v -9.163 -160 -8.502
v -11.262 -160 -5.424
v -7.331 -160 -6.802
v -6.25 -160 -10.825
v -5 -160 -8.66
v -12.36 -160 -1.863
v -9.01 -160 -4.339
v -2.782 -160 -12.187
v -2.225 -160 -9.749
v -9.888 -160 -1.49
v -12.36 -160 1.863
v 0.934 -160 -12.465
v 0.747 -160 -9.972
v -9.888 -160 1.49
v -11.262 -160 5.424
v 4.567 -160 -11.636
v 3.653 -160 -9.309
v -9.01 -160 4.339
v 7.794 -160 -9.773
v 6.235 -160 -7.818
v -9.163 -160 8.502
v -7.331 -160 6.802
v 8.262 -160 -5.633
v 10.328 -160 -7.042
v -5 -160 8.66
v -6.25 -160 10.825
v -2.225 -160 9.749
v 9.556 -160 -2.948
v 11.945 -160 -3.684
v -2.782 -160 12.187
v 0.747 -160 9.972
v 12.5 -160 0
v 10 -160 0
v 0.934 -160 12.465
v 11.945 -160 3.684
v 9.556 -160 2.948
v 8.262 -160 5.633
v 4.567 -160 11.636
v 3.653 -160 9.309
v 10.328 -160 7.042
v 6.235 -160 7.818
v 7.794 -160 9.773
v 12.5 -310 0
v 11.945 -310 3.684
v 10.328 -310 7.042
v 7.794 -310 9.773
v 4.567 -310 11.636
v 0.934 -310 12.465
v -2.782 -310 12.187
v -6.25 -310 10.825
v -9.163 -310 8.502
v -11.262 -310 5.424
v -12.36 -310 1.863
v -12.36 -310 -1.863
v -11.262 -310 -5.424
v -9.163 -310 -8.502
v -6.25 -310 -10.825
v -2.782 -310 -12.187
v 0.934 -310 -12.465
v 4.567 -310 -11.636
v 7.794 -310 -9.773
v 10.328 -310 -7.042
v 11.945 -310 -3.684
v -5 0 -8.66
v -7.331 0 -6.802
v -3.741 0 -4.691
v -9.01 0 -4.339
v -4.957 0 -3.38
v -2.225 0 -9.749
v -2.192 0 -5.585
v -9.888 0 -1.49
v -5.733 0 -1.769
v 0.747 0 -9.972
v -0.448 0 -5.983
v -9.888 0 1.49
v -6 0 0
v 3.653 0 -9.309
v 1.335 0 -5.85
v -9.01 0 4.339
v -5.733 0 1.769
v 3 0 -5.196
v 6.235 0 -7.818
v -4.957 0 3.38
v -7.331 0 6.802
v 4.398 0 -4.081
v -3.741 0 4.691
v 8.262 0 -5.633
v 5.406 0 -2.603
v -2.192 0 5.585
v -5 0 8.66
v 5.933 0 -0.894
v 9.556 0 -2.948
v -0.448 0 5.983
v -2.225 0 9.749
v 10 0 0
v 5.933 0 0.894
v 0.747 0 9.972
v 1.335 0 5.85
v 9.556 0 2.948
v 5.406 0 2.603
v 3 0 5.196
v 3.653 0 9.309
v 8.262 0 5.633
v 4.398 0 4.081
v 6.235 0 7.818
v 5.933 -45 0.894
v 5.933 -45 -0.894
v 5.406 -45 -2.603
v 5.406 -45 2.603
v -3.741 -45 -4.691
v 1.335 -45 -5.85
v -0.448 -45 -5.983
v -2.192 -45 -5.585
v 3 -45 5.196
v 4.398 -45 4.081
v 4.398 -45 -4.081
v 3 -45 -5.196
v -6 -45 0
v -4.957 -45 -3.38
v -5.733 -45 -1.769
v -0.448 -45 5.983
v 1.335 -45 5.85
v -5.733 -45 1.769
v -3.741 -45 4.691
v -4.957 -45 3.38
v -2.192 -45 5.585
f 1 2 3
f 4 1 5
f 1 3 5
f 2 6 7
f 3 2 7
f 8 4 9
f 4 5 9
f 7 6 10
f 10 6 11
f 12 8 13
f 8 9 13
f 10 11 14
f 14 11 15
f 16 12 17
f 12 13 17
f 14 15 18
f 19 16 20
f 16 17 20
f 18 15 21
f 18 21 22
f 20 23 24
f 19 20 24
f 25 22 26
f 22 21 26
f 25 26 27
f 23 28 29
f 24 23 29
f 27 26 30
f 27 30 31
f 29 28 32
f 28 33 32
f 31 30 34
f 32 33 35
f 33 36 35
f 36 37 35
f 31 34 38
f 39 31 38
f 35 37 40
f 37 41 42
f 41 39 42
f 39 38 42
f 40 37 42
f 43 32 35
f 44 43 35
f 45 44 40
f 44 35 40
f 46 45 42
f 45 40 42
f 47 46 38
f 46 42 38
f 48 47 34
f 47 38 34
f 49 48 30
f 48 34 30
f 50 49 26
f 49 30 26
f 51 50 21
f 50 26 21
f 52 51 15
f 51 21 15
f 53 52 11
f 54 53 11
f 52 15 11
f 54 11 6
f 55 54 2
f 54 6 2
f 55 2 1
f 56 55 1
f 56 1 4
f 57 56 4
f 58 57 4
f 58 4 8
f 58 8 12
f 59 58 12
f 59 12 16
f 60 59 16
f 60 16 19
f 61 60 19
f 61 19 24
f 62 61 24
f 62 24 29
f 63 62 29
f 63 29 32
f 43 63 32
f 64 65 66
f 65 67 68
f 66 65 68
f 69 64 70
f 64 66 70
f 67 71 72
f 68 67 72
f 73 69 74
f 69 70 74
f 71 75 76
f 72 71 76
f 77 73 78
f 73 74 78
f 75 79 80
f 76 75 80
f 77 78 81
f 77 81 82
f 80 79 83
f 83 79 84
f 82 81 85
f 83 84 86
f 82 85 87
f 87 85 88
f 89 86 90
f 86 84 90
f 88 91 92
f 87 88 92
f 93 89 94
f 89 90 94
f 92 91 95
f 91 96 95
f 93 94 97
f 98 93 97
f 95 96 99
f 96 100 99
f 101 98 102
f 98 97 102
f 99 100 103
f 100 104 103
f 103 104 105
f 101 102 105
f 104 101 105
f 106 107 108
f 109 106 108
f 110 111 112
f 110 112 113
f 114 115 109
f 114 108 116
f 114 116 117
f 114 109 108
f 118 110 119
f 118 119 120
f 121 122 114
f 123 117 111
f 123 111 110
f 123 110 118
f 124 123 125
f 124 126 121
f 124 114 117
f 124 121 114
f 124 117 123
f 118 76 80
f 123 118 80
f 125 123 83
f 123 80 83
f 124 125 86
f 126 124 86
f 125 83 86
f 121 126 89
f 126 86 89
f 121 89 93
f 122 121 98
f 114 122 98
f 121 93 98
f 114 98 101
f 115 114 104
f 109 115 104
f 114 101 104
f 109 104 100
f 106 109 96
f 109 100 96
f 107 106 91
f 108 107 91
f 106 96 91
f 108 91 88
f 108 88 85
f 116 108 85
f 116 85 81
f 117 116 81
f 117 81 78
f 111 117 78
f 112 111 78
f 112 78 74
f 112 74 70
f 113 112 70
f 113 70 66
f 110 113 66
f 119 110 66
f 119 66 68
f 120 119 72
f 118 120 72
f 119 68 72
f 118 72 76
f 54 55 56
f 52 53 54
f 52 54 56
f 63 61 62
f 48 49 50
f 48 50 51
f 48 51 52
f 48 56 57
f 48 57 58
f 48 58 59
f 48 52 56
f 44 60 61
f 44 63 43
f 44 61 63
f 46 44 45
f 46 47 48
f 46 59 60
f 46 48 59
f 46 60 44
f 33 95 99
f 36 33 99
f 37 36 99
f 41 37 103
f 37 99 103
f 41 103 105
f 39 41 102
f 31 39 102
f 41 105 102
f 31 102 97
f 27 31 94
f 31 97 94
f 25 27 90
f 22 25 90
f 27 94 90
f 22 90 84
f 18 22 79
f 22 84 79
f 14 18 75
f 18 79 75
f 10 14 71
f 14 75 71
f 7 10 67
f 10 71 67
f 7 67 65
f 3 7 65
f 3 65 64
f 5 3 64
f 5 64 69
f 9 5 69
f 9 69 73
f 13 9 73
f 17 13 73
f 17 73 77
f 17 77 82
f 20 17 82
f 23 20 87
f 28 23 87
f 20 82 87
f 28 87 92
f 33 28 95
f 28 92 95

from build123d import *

# Parameters (mm, degrees)
F0_R     = 12.5
F1_DEPTH = 310
F2_R     = 6
F3_DEPTH = 45
F4_SIZE  = 1
F5_R     = 20.961122
F5_R_2   = 10
F6_DEPTH = 160


with BuildPart() as f1:
    # F0 (on Front) → F1 (new body)
    with BuildSketch(Plane.XZ):
        Circle(F0_R)
    extrude(amount=F1_DEPTH)

    # F2 (on face) → F3 (cut)
    with BuildSketch(Plane(origin=(0, 0, 0), x_dir=(-1, 0, 0), z_dir=(0, 1, 0))):
        Circle(F2_R)
    extrude(amount=-F3_DEPTH, mode=Mode.SUBTRACT)

    # F4
    f4_edges = [f1.edges().sort_by_distance(p)[0] for p in [
        (-12.5, 0, 0),
    ]]
    chamfer(f4_edges, length=F4_SIZE)

    # F5 (on Front) → F6 (cut)
    with BuildSketch(Plane.XZ):
        Circle(F5_R)
        Circle(F5_R_2, mode=Mode.SUBTRACT)
    extrude(amount=F6_DEPTH, mode=Mode.SUBTRACT)


solid = f1.part
